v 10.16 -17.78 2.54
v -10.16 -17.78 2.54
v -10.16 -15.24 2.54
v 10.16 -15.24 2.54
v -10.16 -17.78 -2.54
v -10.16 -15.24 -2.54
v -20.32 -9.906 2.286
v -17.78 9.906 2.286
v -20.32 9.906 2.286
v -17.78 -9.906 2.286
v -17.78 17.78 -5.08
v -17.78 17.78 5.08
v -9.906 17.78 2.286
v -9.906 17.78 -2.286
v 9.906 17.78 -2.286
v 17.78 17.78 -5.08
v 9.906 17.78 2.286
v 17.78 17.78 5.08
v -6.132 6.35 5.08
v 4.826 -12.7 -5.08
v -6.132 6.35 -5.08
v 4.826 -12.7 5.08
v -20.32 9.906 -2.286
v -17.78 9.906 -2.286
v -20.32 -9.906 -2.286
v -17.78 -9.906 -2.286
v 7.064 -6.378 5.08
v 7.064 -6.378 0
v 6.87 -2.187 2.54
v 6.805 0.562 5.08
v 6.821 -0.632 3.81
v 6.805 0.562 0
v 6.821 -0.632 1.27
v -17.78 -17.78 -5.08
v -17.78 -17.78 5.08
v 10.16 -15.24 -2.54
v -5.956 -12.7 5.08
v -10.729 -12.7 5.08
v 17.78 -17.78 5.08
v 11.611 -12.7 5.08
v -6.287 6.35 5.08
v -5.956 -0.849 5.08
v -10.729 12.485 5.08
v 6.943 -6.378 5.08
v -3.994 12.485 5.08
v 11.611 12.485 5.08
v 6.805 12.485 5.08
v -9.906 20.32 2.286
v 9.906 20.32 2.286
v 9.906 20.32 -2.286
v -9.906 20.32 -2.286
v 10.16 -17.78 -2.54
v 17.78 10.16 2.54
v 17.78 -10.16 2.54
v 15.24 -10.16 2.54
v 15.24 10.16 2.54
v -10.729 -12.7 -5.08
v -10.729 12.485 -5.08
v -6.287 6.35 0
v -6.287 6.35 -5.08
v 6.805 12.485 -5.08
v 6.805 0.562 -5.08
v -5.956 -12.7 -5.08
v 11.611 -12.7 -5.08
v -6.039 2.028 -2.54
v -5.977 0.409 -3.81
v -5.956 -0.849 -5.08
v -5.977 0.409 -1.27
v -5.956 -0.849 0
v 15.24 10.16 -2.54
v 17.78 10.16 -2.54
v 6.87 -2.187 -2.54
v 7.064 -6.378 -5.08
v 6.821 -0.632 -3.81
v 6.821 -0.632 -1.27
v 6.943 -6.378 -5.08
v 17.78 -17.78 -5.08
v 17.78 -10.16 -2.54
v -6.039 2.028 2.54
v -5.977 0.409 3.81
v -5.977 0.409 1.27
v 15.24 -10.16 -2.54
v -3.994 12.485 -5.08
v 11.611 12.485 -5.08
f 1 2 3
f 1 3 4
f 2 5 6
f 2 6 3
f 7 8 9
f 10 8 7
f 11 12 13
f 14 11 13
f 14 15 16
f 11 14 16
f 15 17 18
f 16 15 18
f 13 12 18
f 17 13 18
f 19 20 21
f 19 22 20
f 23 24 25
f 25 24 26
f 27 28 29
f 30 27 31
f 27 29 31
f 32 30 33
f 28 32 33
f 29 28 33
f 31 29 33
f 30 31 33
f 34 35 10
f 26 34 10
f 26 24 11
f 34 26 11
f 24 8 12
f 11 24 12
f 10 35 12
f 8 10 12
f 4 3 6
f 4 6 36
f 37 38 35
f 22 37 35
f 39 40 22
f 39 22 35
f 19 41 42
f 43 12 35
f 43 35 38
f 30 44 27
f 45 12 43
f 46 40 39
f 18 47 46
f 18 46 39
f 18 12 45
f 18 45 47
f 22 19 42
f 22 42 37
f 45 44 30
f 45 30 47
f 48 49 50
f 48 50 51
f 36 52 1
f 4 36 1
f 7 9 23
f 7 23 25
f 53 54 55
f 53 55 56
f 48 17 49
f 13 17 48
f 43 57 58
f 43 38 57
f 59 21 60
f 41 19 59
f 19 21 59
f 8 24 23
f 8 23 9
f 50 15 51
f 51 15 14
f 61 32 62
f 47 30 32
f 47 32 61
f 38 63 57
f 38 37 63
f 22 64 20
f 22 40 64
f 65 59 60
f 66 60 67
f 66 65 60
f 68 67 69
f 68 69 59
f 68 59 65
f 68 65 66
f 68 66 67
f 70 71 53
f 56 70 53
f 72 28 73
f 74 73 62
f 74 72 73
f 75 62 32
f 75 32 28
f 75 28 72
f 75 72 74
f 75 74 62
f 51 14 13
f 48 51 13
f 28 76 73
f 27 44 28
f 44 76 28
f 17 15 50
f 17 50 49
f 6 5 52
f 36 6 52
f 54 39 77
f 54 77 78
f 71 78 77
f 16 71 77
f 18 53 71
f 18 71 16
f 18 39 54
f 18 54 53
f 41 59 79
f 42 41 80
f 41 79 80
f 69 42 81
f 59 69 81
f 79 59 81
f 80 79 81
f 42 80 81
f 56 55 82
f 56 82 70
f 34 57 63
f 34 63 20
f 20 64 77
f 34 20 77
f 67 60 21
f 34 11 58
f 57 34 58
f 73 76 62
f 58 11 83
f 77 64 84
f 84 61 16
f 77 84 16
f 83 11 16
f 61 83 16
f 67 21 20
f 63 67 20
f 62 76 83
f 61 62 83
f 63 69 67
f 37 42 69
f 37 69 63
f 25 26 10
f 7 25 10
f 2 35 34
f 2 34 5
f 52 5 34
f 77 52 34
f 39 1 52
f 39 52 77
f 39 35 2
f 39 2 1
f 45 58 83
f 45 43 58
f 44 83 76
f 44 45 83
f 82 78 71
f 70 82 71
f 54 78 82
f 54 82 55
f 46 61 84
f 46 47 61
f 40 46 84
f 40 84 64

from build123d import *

# Parameters (mm, degrees)
F0_W     = 35.56
F0_H     = 35.56
F1_DEPTH = 5.08
F2_W     = 19.812
F2_H     = 4.572
F3_DEPTH = 2.54
F4_W     = 19.812
F4_H     = 4.572
F5_DEPTH = 2.54
F6_W     = 20.32
F6_H     = 5.08
F7_DEPTH = 2.54
F8_W     = 20.32
F8_H     = 5.08
F9_DEPTH = 2.54


with BuildPart() as f1:
    # F0 (on Top) → F1 (new body, symmetric)
    with BuildSketch(Plane.XY):
        Rectangle(F0_W, F0_H)
        with BuildLine():
            Line((11.6113498264, 12.4850260417), (11.6113498264, -12.7))
            Line((11.6113498264, -12.7), (4.8258897569, -12.7))
            Line((4.8258897569, -12.7), (-6.1322699653, 6.35))
            Line((-6.1322699653, 6.35), (-6.2866102431, 6.35))
            add(Edge.make_bspline(
                [(-6.2866102431, 6.35), (-5.9558810764, 1.3063802083), (-5.9558810764, -0.8488715278)],
                knots=[0, 0, 0, 1, 1, 1], degree=2))
            Line((-5.9558810764, -0.8488715278), (-5.9558810764, -12.7))
            Line((-5.9558810764, -12.7), (-10.7294053819, -12.7))
            Line((-10.7294053819, -12.7), (-10.7294053819, 12.4850260417))
            Line((-10.7294053819, 12.4850260417), (-3.9935546875, 12.4850260417))
            Line((-3.9935546875, 12.4850260417), (6.9425564236, -6.3775607639))
            Line((6.9425564236, -6.3775607639), (7.0638237847, -6.3775607639))
            add(Edge.make_bspline(
                [(7.0638237847, -6.3775607639), (6.8047526042, -1.4662326389), (6.8047526042, 0.5622395833)],
                knots=[0, 0, 0, 1, 1, 1], degree=2))
            Line((6.8047526042, 0.5622395833), (6.8047526042, 12.4850260417))
            Line((6.8047526042, 12.4850260417), (11.6113498264, 12.4850260417))
        make_face(mode=Mode.SUBTRACT)
    extrude(amount=F1_DEPTH, both=True)

    # F2 (on face) → F3 (join)
    with BuildSketch(Plane(origin=(0, 17.78, 0), x_dir=(-1, 0, 0), z_dir=(0, 1, 0))):
        Rectangle(F2_W, F2_H)
    extrude(amount=F3_DEPTH)

    # F4 (on face) → F5 (join)
    with BuildSketch(Plane(origin=(-17.78, 0, 0), x_dir=(0, -1, 0), z_dir=(-1, 0, 0))):
        Rectangle(F4_W, F4_H)
    extrude(amount=F5_DEPTH)

    # F6 (on face) → F7 (cut)
    with BuildSketch(Plane.XZ.offset(17.78)):
        Rectangle(F6_W, F6_H)
    extrude(amount=-F7_DEPTH, mode=Mode.SUBTRACT)

    # F8 (on face) → F9 (cut)
    with BuildSketch(Plane.YZ.offset(17.78)):
        Rectangle(F8_W, F8_H)
    extrude(amount=-F9_DEPTH, mode=Mode.SUBTRACT)


solid = f1.part
